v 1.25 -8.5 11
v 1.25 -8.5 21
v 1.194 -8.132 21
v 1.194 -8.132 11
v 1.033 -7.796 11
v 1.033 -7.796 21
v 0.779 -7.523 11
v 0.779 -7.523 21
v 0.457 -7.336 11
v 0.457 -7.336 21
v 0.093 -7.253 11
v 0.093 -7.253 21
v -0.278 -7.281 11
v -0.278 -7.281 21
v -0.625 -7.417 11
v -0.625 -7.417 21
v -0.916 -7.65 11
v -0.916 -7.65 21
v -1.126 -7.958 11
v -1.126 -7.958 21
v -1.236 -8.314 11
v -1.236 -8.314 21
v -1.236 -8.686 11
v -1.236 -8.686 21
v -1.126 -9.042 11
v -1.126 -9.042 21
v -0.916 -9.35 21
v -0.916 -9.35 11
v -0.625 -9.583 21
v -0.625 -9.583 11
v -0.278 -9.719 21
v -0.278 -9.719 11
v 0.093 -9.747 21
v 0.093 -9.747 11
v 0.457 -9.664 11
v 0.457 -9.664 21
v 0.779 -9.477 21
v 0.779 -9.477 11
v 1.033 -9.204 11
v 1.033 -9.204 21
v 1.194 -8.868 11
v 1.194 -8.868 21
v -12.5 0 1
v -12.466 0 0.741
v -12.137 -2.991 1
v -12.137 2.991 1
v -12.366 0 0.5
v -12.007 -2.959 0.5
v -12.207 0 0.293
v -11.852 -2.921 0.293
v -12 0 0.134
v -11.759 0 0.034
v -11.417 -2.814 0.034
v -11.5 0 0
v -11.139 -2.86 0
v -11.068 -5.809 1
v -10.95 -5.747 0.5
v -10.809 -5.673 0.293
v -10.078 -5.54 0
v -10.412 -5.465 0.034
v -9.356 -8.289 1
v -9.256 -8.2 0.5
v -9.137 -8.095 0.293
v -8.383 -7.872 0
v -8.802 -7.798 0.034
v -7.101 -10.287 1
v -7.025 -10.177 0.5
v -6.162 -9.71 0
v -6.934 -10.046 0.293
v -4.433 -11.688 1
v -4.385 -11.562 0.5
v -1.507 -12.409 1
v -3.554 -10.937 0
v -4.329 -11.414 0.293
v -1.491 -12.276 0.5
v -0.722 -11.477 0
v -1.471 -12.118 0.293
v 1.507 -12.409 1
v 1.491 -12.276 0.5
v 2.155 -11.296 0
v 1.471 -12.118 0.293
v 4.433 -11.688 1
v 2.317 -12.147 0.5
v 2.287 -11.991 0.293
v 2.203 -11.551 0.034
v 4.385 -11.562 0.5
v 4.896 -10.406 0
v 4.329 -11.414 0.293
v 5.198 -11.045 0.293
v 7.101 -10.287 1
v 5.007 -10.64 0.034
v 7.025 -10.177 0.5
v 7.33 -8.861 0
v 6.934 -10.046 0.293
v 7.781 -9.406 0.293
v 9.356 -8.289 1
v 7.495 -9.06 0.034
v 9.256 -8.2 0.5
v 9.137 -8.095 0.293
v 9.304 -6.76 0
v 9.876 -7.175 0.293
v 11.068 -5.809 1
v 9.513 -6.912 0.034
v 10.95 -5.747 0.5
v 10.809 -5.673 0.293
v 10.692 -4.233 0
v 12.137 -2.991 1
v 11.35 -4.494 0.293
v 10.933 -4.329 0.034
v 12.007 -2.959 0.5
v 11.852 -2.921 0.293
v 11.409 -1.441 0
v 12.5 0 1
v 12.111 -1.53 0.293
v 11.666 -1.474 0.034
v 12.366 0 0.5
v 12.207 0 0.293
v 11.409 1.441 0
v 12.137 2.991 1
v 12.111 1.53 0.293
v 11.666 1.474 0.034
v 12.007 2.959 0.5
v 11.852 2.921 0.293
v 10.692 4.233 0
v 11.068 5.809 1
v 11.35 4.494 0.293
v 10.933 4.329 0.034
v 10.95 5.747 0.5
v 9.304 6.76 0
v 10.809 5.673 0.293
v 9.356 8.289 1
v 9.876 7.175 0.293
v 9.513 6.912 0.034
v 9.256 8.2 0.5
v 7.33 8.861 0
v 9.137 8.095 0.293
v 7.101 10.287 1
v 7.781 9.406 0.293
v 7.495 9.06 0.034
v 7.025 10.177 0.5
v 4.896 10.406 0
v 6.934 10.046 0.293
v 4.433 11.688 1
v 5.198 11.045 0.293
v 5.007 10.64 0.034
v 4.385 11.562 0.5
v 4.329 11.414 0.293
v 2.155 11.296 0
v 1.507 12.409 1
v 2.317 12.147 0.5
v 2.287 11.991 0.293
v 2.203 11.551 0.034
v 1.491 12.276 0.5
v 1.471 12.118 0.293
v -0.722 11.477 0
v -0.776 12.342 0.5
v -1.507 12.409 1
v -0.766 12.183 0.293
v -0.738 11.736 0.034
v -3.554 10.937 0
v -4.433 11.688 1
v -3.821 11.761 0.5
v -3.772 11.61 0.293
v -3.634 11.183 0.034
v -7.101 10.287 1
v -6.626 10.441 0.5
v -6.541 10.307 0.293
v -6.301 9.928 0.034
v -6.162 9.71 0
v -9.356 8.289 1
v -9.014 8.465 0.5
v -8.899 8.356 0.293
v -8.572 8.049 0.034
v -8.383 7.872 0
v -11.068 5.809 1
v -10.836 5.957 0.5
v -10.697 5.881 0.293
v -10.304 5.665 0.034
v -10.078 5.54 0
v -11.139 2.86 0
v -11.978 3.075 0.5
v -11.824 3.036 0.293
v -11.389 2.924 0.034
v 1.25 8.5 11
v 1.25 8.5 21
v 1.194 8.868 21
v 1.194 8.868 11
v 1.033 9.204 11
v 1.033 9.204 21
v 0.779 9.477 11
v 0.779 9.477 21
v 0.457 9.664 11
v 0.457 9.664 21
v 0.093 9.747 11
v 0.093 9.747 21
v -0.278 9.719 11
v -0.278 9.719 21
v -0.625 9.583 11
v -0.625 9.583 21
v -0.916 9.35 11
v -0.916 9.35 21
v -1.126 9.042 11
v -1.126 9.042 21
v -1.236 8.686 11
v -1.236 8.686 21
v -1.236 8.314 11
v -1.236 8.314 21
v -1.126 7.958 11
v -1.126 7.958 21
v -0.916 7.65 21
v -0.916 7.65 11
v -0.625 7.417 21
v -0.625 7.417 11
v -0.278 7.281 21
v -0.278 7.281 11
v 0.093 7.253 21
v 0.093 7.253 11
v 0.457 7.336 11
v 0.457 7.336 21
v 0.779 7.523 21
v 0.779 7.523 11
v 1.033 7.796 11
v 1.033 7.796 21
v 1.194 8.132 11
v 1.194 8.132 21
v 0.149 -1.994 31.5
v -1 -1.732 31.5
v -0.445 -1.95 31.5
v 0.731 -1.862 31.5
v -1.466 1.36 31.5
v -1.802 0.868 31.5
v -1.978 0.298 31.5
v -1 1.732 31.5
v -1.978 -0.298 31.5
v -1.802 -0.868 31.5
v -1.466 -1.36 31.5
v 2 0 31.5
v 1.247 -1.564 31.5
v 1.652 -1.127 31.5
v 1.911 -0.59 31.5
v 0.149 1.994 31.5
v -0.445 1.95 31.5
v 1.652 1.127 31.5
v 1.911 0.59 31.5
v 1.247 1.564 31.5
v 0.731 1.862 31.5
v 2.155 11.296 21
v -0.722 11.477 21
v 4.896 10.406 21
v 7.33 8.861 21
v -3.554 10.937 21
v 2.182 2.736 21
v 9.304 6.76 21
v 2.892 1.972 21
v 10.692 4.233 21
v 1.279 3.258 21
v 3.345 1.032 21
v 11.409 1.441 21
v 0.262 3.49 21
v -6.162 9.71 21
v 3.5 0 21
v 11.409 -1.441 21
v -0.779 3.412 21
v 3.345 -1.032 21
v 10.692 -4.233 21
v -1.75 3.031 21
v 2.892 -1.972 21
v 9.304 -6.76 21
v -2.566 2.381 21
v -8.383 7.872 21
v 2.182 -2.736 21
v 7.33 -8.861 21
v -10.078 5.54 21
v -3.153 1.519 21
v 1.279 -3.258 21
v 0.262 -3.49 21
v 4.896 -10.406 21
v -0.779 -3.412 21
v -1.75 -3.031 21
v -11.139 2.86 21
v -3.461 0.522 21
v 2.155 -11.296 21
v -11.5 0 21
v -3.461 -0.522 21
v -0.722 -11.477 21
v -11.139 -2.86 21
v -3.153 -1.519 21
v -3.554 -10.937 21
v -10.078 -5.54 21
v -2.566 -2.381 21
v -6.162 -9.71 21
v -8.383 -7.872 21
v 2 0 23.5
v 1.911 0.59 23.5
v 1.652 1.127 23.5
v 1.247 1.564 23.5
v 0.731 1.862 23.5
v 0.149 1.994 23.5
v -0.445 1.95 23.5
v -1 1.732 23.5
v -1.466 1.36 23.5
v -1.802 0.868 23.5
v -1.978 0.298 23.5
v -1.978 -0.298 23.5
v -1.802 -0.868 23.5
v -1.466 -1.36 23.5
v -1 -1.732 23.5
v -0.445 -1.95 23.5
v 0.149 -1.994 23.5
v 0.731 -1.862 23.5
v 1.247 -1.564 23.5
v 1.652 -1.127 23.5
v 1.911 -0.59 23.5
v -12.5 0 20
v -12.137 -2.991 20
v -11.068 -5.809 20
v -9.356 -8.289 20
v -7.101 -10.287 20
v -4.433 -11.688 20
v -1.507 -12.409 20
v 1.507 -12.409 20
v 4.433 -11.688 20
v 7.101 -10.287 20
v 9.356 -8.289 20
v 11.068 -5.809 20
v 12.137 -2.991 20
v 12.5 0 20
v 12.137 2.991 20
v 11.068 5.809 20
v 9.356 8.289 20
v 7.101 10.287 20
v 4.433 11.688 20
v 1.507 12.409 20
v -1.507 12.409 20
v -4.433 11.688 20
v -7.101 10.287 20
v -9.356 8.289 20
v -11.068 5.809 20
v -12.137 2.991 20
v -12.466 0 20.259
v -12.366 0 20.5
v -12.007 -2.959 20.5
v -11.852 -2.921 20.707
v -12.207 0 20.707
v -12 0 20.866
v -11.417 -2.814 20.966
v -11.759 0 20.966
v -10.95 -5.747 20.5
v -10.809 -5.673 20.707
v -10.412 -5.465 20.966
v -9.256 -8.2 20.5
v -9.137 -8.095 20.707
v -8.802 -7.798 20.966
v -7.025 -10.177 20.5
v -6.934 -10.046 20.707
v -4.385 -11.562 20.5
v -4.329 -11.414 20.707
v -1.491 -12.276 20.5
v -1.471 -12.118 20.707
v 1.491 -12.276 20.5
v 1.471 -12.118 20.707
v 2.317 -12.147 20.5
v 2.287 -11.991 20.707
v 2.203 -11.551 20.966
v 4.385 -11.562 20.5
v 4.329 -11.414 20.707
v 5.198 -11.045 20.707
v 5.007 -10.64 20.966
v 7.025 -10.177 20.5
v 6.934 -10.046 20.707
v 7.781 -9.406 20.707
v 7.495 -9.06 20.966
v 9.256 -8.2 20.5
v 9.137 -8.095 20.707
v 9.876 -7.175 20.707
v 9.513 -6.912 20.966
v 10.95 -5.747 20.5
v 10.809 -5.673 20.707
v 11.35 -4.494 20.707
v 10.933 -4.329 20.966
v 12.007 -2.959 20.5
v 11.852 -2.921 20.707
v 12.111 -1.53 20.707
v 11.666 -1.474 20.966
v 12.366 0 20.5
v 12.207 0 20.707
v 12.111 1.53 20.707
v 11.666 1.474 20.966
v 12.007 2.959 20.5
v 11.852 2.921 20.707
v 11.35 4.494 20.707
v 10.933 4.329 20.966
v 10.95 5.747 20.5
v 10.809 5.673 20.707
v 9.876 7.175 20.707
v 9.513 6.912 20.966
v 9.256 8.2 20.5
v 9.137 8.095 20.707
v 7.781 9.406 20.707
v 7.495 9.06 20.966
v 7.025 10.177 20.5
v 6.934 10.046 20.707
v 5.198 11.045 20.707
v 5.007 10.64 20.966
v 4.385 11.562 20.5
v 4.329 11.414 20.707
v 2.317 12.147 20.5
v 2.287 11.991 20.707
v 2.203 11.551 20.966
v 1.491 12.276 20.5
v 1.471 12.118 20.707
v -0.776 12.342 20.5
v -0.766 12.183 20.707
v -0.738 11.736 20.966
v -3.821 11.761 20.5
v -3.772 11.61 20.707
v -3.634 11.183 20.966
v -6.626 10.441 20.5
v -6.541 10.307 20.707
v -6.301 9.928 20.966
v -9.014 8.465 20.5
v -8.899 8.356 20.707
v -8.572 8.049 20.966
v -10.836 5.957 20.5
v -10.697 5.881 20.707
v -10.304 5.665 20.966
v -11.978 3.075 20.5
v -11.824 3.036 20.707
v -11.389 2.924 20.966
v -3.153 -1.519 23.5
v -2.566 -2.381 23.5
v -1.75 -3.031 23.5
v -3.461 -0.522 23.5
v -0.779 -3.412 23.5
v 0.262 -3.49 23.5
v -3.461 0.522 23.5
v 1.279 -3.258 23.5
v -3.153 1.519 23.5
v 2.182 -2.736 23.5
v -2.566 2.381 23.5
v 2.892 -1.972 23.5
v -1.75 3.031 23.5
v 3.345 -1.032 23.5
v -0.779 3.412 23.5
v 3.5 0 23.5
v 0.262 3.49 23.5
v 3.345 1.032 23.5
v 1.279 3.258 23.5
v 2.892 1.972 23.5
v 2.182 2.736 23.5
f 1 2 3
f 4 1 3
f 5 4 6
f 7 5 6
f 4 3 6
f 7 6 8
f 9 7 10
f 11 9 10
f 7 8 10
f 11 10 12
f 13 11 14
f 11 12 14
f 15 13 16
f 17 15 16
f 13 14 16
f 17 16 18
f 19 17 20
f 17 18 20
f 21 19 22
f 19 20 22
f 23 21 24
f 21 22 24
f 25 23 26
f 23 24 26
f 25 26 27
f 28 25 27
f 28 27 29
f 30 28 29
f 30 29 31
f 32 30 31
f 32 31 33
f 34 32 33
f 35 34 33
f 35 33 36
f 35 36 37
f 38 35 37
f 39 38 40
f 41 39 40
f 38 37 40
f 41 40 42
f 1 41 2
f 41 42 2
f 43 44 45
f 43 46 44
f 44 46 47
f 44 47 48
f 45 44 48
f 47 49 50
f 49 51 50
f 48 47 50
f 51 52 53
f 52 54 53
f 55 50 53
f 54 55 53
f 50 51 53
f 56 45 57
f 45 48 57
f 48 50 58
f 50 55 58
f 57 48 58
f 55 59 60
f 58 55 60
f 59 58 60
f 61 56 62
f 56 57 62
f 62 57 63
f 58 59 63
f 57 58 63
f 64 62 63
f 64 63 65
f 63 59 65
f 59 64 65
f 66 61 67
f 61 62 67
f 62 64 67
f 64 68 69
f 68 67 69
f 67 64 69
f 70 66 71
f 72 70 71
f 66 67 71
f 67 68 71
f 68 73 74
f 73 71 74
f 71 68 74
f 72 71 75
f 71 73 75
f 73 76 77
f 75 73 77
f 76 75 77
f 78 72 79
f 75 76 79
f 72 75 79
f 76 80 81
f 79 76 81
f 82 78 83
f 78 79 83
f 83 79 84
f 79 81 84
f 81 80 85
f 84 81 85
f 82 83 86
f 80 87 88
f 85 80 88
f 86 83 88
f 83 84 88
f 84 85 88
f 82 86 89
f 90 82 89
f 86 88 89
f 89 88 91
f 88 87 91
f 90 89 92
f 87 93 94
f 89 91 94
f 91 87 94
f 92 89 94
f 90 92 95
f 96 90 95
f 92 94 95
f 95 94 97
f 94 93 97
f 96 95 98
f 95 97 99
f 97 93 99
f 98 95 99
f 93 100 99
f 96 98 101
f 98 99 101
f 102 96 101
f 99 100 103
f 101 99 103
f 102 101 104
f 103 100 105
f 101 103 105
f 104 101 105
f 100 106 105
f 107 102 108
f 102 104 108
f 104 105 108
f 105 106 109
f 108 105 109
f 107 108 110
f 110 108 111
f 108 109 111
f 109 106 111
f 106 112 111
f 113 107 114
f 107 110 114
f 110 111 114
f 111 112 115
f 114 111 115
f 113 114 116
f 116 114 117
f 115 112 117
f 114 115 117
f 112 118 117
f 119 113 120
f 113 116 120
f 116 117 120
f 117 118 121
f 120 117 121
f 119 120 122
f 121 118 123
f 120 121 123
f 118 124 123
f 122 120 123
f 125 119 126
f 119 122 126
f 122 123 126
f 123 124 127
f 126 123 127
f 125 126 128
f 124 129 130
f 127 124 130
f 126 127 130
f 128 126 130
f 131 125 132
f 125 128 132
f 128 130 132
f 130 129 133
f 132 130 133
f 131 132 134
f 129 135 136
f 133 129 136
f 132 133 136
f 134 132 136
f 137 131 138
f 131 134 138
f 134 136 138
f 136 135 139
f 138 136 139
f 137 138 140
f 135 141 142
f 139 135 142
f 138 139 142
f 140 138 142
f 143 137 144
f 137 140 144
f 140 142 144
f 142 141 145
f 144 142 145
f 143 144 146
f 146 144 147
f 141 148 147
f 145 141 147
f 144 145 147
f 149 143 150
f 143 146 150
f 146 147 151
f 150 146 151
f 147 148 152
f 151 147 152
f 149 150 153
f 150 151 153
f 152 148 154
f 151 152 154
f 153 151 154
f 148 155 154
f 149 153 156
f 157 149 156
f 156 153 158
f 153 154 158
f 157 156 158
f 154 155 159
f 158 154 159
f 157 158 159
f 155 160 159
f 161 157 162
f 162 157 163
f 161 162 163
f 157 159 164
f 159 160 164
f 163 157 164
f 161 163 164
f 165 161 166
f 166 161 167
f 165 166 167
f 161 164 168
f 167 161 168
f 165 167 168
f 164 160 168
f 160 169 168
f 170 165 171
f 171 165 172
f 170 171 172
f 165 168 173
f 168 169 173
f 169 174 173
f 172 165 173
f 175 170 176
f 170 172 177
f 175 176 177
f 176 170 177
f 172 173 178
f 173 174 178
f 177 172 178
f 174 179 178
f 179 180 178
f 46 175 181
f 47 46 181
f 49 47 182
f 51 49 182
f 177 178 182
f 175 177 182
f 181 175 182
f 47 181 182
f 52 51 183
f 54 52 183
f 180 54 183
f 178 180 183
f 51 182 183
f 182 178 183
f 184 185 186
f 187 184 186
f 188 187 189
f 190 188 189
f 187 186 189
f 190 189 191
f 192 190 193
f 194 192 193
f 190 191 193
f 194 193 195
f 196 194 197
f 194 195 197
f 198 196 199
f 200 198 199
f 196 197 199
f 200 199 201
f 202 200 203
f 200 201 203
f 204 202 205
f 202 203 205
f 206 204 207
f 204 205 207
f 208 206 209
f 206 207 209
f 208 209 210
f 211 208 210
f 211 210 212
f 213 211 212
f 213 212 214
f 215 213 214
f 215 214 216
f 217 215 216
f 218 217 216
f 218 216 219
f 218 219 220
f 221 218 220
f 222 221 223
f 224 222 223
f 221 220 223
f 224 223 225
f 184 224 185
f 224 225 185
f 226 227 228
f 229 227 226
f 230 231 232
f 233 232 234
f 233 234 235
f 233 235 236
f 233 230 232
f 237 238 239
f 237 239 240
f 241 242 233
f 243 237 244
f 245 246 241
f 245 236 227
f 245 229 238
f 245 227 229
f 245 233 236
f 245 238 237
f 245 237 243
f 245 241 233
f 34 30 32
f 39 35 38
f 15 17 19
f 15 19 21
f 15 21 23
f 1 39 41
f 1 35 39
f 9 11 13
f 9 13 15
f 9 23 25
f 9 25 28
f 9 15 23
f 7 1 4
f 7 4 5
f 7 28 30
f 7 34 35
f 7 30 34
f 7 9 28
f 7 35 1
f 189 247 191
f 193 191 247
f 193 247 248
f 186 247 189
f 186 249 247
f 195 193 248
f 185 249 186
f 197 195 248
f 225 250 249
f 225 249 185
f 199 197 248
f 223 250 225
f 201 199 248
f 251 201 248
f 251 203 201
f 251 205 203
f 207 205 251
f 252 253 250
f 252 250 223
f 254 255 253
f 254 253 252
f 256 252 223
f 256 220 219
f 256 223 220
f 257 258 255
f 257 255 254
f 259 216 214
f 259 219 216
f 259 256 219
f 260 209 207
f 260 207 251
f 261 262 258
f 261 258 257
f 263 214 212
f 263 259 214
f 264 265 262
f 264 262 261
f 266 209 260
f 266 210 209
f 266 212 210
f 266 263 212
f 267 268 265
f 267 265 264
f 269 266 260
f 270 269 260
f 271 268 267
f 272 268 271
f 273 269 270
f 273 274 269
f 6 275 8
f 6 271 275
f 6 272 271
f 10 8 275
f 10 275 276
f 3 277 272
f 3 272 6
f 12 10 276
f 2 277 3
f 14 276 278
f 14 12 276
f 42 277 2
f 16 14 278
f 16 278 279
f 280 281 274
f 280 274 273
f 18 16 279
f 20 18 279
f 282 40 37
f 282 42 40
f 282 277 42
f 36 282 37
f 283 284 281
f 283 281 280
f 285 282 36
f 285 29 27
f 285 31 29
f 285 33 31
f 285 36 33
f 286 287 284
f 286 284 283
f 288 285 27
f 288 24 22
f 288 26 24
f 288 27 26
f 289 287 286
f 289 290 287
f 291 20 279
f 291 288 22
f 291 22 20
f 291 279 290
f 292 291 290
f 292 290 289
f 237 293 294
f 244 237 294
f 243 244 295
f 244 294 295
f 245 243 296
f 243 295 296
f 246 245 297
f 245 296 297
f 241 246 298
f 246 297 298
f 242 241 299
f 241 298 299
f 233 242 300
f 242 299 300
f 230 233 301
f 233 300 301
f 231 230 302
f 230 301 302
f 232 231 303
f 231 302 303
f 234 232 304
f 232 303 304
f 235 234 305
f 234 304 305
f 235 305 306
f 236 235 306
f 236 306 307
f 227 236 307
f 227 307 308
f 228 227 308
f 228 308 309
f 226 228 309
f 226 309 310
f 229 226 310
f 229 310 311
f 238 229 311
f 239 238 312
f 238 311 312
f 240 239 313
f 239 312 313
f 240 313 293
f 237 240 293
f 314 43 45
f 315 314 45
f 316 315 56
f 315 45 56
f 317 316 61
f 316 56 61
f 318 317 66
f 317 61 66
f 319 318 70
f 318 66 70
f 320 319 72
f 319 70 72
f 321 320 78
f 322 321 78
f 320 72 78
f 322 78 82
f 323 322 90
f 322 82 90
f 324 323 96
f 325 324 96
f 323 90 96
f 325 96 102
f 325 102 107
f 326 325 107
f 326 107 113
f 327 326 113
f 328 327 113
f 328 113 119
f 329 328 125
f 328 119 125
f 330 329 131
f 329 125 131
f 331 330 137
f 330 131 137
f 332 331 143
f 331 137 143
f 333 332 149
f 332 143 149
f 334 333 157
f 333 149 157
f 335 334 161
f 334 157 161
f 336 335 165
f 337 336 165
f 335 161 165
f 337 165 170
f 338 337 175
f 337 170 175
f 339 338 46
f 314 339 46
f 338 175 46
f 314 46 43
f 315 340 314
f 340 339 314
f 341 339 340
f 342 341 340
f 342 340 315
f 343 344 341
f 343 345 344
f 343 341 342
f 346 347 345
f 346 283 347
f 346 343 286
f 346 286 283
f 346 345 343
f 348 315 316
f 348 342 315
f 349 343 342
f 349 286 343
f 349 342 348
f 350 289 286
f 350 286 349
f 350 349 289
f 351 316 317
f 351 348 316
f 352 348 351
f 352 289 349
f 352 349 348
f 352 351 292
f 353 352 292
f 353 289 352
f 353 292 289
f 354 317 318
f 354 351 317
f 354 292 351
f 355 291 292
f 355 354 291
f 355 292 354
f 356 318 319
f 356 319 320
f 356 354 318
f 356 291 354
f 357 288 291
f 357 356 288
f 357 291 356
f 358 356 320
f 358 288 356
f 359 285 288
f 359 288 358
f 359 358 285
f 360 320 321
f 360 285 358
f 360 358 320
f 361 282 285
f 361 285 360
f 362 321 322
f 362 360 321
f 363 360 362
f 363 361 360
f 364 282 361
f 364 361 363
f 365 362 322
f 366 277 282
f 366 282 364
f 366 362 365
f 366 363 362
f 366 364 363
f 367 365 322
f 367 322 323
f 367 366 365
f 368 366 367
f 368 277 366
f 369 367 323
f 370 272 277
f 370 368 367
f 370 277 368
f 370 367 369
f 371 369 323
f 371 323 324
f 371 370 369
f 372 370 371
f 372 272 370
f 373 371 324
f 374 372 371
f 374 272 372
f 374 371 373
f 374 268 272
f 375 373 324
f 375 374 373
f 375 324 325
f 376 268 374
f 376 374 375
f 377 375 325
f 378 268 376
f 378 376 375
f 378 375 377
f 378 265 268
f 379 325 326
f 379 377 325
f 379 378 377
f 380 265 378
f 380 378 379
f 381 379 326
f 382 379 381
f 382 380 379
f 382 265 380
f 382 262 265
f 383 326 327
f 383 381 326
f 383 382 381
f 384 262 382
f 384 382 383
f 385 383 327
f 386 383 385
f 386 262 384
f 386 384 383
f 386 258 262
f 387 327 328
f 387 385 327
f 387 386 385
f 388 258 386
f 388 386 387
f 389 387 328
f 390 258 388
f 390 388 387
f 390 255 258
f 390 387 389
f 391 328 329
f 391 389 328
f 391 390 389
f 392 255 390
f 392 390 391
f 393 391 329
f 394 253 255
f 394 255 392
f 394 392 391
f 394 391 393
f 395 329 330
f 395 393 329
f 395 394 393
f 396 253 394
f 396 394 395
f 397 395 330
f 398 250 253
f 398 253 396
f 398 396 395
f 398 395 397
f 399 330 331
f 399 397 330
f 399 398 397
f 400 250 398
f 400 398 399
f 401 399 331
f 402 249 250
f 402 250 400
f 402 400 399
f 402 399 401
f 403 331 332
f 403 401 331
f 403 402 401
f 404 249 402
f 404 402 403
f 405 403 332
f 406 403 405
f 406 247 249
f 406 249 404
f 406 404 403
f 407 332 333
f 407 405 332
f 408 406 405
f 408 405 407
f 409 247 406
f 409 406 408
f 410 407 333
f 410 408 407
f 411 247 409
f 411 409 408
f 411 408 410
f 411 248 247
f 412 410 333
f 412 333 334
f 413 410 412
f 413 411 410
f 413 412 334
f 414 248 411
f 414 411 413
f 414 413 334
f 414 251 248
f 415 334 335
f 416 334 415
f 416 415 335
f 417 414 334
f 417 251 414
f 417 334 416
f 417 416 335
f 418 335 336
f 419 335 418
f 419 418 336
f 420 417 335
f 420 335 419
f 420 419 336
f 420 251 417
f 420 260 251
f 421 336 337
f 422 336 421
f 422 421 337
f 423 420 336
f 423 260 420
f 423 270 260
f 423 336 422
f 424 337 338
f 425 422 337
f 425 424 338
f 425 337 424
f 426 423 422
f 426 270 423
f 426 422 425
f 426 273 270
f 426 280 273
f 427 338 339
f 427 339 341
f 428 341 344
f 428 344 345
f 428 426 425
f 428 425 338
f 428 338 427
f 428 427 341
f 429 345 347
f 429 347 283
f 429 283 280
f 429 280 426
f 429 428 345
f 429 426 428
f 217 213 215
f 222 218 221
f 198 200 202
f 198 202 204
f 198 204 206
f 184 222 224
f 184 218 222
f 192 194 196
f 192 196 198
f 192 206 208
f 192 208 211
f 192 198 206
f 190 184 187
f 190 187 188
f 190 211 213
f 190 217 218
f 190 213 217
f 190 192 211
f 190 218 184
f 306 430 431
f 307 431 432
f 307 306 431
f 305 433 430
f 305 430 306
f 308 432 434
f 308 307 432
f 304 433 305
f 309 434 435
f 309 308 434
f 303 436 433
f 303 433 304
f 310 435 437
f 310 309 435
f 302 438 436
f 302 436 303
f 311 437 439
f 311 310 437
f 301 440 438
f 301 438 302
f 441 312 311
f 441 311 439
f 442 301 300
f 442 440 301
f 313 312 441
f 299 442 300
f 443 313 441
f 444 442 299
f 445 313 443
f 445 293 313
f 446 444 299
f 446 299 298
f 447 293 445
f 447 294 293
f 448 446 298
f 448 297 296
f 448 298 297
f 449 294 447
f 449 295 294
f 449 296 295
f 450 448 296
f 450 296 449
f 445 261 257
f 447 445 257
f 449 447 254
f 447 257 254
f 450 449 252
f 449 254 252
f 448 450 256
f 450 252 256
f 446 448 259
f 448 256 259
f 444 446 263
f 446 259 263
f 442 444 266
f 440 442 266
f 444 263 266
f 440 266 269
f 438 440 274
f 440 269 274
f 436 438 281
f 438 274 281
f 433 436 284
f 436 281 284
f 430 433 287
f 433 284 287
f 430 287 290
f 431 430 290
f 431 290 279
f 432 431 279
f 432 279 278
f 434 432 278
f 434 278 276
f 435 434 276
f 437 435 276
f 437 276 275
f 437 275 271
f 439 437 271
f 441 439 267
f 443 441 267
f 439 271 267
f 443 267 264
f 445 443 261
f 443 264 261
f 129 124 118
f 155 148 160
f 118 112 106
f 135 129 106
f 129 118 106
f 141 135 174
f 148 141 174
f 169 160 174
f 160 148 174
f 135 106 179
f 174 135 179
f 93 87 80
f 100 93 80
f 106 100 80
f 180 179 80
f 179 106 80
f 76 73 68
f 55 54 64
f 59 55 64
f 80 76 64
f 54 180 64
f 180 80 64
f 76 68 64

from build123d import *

# Parameters (mm, degrees)
ESBO_O1_R                = 12.5
RESSALTO_EXTRUS_O1_DEPTH = 21
ESBO_O2_R                = 3.5
RESSALTO_EXTRUS_O2_DEPTH = 2.5
FILETE1_R                = 1
ESBO_O3_R                = 2
RESSALTO_EXTRUS_O3_DEPTH = 8
ESBO_O4_R                = 1.25
CORTE_EXTRUS_O1_DEPTH    = 10


with BuildPart() as part:
    # Esboço1 → Ressalto-extrusão1 (new body)
    with BuildSketch(Plane.XY):
        with Locations(Location((0, 0, 0), (0, 0, 180))):
            Circle(ESBO_O1_R)
    extrude(amount=RESSALTO_EXTRUS_O1_DEPTH)

    # Esboço2 → Ressalto-extrusão2 (add)
    with BuildSketch(Plane.XY.offset(21)):
        Circle(ESBO_O2_R)
    extrude(amount=RESSALTO_EXTRUS_O2_DEPTH)

    # Filete1
    filete1_edges = [part.edges().sort_by_distance(p)[0] for p in [
        (12.5, 0, 0),
        (12.5, 0, 21),
    ]]
    fillet(filete1_edges, radius=FILETE1_R)

    # Esboço3 → Ressalto-extrusão3 (add)
    with BuildSketch(Plane.XY.offset(23.5)):
        Circle(ESBO_O3_R)
    extrude(amount=RESSALTO_EXTRUS_O3_DEPTH)

    # Esboço4 → Corte-extrusão1 (cut)
    with BuildSketch(Plane.XY.offset(21)):
        with Locations((0, 8.5)):
            Circle(ESBO_O4_R)
        with Locations((0, -8.5)):
            Circle(ESBO_O4_R)
    extrude(amount=-CORTE_EXTRUS_O1_DEPTH, mode=Mode.SUBTRACT)


solid = part.part
